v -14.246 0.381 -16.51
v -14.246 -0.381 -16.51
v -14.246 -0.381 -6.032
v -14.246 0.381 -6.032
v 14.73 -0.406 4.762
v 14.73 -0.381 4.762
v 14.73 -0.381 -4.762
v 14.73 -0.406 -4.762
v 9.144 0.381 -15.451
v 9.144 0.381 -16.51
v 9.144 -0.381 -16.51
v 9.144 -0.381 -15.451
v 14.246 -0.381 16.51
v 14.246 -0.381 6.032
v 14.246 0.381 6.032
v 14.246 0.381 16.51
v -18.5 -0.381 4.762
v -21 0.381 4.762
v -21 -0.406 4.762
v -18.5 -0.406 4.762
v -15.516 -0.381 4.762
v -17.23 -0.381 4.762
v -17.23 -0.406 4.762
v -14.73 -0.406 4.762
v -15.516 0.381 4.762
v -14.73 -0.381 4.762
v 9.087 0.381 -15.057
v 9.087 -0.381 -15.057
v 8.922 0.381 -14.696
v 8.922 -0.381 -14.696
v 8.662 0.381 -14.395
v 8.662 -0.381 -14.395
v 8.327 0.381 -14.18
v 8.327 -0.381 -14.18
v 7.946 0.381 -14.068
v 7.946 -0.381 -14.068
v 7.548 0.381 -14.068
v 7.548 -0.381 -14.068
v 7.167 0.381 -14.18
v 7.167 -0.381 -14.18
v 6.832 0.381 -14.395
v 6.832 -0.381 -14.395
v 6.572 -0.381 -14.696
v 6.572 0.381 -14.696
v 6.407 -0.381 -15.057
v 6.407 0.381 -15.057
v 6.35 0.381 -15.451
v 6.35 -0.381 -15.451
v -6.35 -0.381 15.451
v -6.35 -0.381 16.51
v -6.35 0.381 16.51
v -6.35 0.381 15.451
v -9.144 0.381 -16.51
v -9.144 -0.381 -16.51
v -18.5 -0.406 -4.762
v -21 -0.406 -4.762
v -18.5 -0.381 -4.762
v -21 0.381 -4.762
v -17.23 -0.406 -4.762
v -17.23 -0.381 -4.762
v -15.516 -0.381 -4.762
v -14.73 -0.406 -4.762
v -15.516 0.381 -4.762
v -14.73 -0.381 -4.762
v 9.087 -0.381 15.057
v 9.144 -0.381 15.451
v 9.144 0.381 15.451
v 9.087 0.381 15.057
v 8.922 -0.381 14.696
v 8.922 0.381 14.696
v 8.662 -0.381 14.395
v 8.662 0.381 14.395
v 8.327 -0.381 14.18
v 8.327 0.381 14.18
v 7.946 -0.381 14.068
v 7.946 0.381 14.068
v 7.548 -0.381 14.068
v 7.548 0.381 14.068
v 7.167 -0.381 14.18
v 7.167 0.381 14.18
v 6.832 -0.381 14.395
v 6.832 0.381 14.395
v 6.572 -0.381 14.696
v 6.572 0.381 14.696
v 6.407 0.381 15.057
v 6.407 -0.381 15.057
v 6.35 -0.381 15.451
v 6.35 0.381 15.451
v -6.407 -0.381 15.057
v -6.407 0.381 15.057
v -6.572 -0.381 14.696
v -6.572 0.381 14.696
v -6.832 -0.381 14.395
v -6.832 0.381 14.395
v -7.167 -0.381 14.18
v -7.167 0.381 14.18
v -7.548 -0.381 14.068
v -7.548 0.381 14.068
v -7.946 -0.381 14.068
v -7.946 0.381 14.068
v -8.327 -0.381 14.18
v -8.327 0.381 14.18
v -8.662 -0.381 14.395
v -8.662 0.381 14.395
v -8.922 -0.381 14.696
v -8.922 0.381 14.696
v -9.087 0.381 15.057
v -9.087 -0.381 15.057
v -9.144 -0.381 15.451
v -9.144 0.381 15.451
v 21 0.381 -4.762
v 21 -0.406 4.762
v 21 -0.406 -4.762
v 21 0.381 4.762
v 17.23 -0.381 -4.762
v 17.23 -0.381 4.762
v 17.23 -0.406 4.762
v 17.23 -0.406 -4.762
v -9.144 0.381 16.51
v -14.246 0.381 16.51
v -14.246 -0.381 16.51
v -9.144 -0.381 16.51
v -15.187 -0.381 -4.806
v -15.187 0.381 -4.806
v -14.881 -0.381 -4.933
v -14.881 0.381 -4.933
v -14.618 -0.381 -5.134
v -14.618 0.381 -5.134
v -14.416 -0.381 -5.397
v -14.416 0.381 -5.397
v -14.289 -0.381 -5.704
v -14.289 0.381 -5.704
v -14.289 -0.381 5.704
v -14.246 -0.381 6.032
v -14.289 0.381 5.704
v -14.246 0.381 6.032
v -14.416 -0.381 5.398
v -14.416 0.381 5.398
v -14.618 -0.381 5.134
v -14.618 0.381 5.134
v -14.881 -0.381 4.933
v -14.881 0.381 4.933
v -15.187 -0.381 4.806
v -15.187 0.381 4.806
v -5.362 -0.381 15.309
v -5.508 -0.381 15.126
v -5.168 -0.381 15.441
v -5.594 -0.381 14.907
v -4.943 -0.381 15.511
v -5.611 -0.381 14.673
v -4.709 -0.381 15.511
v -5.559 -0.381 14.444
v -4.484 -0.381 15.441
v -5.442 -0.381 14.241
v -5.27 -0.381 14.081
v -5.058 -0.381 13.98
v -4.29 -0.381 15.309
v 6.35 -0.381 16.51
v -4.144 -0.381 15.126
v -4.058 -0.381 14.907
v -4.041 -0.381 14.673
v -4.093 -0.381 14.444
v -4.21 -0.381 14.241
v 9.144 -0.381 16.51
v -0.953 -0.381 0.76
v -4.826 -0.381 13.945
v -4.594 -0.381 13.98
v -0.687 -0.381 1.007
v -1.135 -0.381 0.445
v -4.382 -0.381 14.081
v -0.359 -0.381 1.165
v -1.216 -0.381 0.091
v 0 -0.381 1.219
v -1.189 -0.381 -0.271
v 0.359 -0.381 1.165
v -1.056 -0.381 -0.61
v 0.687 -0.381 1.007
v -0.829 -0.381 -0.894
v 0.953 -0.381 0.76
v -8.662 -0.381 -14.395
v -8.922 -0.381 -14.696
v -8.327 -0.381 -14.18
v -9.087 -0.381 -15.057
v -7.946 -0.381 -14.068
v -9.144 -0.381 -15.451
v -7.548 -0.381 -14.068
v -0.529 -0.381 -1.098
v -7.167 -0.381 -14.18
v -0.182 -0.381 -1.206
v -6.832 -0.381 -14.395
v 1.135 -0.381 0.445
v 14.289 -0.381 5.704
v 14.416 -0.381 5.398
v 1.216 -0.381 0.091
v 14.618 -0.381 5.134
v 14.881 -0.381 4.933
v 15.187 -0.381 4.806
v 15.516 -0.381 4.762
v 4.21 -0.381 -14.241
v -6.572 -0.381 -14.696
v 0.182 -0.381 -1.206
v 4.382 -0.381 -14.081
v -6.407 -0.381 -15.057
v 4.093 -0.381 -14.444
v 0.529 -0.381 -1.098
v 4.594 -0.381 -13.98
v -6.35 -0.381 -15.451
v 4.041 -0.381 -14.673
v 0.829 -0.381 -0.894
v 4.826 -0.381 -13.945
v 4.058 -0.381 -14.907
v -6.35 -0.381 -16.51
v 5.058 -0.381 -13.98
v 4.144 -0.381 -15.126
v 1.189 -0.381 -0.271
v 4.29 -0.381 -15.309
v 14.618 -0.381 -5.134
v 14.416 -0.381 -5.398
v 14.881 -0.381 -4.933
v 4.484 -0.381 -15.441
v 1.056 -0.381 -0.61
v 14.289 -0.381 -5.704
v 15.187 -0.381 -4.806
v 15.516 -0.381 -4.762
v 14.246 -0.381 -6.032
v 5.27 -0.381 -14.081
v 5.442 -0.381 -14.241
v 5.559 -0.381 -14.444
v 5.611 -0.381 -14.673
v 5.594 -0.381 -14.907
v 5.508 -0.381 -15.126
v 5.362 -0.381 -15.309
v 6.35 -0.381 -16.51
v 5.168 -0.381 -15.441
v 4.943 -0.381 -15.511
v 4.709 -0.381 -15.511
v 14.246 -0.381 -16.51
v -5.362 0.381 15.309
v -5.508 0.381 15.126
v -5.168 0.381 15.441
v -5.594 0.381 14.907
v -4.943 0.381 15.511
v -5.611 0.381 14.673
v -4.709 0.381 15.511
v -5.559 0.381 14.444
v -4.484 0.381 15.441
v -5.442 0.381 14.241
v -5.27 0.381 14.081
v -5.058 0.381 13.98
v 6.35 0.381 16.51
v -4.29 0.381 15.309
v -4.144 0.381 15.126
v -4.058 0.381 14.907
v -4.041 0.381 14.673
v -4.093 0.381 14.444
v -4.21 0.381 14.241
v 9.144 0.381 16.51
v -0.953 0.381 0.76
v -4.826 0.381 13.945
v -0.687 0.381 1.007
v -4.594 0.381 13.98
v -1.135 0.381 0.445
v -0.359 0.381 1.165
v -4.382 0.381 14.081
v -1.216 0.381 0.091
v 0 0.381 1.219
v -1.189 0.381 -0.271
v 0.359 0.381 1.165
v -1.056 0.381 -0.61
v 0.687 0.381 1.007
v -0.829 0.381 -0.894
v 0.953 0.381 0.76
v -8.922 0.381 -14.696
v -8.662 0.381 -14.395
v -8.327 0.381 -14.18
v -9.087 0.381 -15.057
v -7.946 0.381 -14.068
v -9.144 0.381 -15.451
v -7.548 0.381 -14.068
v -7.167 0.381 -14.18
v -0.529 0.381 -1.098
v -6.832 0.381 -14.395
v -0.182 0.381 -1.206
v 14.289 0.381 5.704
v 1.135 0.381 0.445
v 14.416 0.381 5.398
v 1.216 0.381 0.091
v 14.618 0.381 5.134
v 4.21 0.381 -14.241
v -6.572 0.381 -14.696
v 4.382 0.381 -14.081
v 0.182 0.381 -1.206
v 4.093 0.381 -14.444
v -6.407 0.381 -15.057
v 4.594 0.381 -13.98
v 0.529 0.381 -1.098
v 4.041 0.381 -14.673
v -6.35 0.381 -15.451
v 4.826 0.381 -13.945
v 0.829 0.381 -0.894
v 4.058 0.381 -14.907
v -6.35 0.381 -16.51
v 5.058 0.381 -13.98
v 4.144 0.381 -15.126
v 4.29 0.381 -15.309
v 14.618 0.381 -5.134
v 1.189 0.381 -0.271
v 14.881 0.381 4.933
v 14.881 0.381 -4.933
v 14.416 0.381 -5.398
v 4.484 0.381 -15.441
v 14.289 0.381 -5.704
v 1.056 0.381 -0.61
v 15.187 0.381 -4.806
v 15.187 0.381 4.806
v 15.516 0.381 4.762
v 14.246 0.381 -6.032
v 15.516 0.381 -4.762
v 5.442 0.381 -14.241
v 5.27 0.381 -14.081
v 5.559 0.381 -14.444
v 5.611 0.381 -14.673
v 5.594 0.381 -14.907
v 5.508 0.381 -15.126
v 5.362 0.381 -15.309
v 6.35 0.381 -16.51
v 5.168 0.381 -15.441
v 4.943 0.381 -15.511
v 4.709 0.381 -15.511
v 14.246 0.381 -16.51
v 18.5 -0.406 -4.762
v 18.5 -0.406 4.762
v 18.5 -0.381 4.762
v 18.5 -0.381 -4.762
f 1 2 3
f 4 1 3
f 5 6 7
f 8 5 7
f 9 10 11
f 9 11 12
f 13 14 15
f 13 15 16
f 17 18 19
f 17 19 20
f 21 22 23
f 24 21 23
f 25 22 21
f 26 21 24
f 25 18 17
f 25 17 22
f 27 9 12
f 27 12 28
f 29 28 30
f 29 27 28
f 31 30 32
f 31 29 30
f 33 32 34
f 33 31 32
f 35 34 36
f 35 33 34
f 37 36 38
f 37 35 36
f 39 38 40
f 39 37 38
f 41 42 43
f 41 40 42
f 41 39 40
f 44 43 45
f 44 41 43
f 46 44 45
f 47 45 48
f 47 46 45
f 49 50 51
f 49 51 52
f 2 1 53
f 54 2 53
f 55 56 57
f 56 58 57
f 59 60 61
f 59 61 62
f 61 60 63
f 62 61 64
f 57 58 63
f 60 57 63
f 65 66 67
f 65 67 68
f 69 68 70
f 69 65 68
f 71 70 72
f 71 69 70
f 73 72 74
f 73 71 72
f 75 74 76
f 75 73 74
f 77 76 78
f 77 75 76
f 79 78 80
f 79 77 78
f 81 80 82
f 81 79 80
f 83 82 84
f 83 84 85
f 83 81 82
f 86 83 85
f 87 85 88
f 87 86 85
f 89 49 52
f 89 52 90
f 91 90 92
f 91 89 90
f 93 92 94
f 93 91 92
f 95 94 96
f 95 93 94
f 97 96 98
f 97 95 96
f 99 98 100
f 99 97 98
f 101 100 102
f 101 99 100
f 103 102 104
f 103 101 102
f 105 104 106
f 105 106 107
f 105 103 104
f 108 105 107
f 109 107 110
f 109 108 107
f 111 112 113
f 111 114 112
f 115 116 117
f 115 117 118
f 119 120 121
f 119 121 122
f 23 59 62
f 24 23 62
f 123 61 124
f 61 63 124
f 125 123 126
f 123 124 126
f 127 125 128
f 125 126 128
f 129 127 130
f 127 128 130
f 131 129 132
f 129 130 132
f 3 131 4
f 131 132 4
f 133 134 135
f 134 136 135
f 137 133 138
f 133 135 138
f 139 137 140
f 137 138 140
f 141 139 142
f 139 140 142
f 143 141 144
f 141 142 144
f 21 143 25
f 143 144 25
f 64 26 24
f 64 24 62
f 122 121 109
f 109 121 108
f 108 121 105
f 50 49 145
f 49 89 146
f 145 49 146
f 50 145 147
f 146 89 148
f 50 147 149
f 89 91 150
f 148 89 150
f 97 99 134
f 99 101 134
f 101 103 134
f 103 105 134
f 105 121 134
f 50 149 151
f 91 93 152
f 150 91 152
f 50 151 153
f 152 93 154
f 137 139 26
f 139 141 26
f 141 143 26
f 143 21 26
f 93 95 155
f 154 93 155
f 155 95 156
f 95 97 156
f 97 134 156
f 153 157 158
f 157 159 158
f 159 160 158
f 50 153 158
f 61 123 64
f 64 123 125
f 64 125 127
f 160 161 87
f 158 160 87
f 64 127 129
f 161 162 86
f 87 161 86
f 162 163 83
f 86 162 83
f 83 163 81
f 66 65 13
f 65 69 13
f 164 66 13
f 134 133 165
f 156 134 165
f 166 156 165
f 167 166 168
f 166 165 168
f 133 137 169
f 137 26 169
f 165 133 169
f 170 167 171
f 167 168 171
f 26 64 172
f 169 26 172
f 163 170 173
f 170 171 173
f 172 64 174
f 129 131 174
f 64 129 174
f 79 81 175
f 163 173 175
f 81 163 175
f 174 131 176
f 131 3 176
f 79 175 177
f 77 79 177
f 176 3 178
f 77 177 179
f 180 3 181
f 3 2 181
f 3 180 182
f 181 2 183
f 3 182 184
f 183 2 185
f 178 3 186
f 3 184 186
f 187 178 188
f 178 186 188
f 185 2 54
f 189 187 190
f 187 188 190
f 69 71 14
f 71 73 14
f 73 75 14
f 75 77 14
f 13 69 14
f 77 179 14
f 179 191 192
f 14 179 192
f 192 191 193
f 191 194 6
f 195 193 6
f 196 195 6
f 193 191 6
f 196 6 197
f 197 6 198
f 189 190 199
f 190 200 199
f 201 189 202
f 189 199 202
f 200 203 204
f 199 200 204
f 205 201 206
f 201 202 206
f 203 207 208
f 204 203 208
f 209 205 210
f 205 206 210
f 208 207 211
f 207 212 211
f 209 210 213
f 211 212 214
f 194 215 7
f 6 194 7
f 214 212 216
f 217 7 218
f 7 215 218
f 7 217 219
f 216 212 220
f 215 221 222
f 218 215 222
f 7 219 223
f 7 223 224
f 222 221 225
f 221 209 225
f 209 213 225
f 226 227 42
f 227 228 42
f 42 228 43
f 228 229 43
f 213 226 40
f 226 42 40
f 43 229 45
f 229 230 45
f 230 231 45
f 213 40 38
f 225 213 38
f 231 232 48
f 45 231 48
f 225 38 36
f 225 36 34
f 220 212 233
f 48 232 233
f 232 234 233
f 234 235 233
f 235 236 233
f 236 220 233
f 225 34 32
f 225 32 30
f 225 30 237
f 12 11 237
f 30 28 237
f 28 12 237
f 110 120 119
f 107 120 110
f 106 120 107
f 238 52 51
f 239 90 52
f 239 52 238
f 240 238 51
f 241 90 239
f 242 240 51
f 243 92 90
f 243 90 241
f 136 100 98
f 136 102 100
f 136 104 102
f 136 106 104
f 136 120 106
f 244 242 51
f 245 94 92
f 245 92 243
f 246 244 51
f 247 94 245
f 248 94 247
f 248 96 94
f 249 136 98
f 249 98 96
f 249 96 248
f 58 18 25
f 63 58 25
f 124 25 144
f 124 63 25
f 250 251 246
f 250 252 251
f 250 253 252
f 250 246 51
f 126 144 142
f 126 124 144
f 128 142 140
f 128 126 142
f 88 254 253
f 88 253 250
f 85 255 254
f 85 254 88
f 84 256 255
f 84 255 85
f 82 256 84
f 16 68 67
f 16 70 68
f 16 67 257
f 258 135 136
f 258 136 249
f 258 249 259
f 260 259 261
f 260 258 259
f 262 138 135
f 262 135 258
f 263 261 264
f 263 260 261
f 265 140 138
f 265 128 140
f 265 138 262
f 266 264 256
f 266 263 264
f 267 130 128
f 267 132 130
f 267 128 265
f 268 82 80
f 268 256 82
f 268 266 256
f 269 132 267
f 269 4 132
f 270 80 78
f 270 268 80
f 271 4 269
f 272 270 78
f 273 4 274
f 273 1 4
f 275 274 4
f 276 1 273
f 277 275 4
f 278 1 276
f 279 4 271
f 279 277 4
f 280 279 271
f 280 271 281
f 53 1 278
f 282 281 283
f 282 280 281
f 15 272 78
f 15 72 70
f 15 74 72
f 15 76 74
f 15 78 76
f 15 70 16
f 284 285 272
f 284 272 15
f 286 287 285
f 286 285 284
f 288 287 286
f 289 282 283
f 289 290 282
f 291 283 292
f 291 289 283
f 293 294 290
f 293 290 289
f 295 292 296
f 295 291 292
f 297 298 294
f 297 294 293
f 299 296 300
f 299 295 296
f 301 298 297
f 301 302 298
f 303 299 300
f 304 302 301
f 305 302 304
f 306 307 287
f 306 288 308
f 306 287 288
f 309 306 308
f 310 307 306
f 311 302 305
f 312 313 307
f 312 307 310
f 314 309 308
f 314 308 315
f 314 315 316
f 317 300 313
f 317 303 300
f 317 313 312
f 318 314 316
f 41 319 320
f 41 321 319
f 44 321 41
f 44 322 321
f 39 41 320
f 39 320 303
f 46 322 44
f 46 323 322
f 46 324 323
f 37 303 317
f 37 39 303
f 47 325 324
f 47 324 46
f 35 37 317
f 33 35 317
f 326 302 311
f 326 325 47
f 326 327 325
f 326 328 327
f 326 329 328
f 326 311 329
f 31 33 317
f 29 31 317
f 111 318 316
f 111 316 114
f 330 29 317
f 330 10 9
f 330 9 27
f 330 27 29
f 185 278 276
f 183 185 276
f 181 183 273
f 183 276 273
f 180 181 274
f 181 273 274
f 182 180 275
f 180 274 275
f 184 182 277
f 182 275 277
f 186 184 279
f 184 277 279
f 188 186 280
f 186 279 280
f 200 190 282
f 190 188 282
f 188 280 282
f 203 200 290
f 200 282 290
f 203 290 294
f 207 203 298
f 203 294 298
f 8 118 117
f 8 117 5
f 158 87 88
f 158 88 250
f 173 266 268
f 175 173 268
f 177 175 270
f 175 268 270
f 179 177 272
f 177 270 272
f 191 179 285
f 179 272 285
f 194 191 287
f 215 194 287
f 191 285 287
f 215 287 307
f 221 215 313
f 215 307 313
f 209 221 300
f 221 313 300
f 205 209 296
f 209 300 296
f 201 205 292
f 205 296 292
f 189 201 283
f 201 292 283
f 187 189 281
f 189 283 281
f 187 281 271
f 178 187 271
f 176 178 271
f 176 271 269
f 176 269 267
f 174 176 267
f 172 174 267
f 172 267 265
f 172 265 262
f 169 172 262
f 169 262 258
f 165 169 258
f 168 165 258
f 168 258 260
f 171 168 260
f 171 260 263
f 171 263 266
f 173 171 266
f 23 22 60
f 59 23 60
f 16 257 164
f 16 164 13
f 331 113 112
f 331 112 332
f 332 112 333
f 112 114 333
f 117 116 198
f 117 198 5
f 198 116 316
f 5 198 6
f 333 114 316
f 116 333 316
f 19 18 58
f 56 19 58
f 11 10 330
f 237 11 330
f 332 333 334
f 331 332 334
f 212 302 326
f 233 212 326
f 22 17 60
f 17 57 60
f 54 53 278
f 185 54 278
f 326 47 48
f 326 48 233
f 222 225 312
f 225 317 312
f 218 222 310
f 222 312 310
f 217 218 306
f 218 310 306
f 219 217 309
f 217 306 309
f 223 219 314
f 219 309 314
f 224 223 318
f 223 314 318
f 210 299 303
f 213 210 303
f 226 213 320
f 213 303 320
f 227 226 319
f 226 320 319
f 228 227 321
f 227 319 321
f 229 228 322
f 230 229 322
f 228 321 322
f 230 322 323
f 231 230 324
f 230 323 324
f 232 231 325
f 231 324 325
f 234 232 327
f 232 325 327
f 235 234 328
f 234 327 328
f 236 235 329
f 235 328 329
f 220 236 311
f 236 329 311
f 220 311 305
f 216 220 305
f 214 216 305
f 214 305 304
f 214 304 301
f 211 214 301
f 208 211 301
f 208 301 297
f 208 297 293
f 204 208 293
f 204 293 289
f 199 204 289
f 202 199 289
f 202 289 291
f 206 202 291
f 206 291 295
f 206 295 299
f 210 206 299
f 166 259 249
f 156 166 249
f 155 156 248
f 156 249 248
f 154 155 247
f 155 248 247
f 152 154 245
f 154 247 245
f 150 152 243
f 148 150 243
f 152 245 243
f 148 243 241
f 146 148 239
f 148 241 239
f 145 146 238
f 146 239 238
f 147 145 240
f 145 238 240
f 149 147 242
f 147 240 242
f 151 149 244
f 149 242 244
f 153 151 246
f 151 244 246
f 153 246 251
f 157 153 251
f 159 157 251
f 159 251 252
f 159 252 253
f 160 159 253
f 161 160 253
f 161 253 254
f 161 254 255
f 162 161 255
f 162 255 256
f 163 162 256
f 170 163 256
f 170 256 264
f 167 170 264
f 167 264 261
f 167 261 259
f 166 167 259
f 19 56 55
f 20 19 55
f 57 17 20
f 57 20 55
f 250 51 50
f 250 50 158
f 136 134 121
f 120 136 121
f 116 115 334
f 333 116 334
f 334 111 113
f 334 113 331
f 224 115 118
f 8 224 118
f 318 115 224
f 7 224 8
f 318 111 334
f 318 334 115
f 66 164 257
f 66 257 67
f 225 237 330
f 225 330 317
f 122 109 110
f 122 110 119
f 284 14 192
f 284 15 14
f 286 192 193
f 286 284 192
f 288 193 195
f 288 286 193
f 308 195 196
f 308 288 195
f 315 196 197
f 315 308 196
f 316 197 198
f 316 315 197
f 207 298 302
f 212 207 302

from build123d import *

# Parameters (mm, degrees)
SKETCH1_W            = 42
SKETCH1_H            = 33.02
BOSS_EXTRUDE1_DEPTH  = 0.381
SKETCH3_R            = 1.2192
CUT_EXTRUDE2_DEPTH   = 1.5875
CUT_EXTRUDE1_REACH   = 28.724
CUT_EXTRUDE3_START   = -0.762
CUT_EXTRUDE3_DEPTH   = 0.762
FILLET1_R            = 1.27
CUT_EXTRUDE4_REACH   = 28.724
SKETCH7_R            = 0.7874
FILLET1_OF_MIRROR1_R = 1.27
MIRROR2_START        = -0.381
MIRROR2_DEPTH        = 0.762
SKETCH6_W            = 2.5
SKETCH6_H            = 9.525
BOSS_EXTRUDE2_DEPTH  = 0.0254
CIRPATTERN1_COUNT    = 2


# Read off the part's stored shape, not the designer's step: Mirror2
with BuildPart() as part:
    # Sketch1 → Boss-Extrude1 (new, symmetric)
    with BuildSketch(Plane(origin=(0, 0, 0), x_dir=(1, 0, 0), z_dir=(0, 1, 0))):
        Rectangle(SKETCH1_W, SKETCH1_H)
    extrude(amount=BOSS_EXTRUDE1_DEPTH, both=True)

    # Sketch3 → Cut-Extrude2 (cut)
    with BuildSketch(Plane(origin=(0, 0.381, 0), x_dir=(1, 0, 0), z_dir=(0, 1, 0))):
        with Locations(Location((0, 0, 0), (0, 0, 270))):
            Circle(SKETCH3_R)
    extrude(amount=-CUT_EXTRUDE2_DEPTH, mode=Mode.SUBTRACT)

    # Sketch2 → Cut-Extrude1 (cut, up to next)
    with BuildSketch(Plane(origin=(0, 0.381, 0), x_dir=(1, 0, 0), z_dir=(0, 1, 0)), mode=Mode.PRIVATE) as cut_extrude1_sk1:
        with BuildLine():
            Line((9.144, 16.51), (9.144, 15.45082))
            ThreePointArc((9.144, 15.45082), (7.747, 14.05382), (6.35, 15.45082))
            Line((6.35, 15.45082), (6.35, 16.51))
            ThreePointArc((6.35, 16.51), (7.747, 17.907), (9.144, 16.51))
        make_face()
    cut_extrude1_tool1 = extrude(cut_extrude1_sk1.sketch, amount=-CUT_EXTRUDE1_REACH, mode=Mode.PRIVATE) & part.part
    cut_extrude1 = cut_extrude1_tool1.solids().sort_by_distance((7.747, 0.381, -15.98041))[0]
    add(cut_extrude1, mode=Mode.SUBTRACT)

    # Sketch5 → Cut-Extrude3 (cut)
    with BuildSketch(Plane(origin=(0, 0.381, 0), x_dir=(1, 0, 0), z_dir=(0, 1, 0)).offset(CUT_EXTRUDE3_START)):
        Polygon((21, 4.7625), (21, -4.7625), (14.24559, -4.7625), (14.24559, -19.569767896), (25.307623141, -19.569767896), (25.307623141, 18.786679146), (14.24559, 18.786679146), (14.24559, 4.7625), align=None)
    cut_extrude3 = extrude(amount=CUT_EXTRUDE3_DEPTH, mode=Mode.SUBTRACT)

    # Fillet1
    fillet1_edges = [part.edges().sort_by_distance(p)[0] for p in [
        (14.24559, 0, 4.7625),
        (14.24559, 0, -4.7625),
    ]]
    fillet(fillet1_edges, radius=FILLET1_R)

    # Sketch7 → Cut-Extrude4 (cut, up to next)
    with BuildSketch(Plane(origin=(0, 0.381, 0), x_dir=(1, 0, 0), z_dir=(0, 1, 0)), mode=Mode.PRIVATE) as cut_extrude4_sk1:
        with Locations(Location((4.826, 14.732, 0), (0, 0, 270))):
            Circle(SKETCH7_R)
    cut_extrude4_tool1 = extrude(cut_extrude4_sk1.sketch, amount=-CUT_EXTRUDE4_REACH, mode=Mode.PRIVATE) & part.part
    cut_extrude4 = cut_extrude4_tool1.solids().sort_by_distance((4.826, 0.381, -14.732))[0]
    add(cut_extrude4, mode=Mode.SUBTRACT)

    # Mirror1: Cut-Extrude1, Cut-Extrude3 across plane
    add(cut_extrude1.mirror(Plane(origin=(0, 0, 0), x_dir=(0, 0, 1), z_dir=(1, 0, 0))), mode=Mode.SUBTRACT)
    add(cut_extrude3.mirror(Plane(origin=(0, 0, 0), x_dir=(0, 0, 1), z_dir=(1, 0, 0))), mode=Mode.SUBTRACT)

    # Fillet1 of Mirror1
    fillet1_of_mirror1_edges = [part.edges().sort_by_distance(p)[0] for p in [
        (-14.24559, 0, 4.7625),
        (-14.24559, 0, -4.7625),
    ]]
    fillet(fillet1_of_mirror1_edges, radius=FILLET1_OF_MIRROR1_R)

    # Mirror2 outline → Mirror2 (cut)
    with BuildSketch(Plane(origin=(0, 0, 0), x_dir=(1, 0, 0), z_dir=(0, 1, 0)).offset(MIRROR2_START)):
        with BuildLine():
            Line((-9.144, -16.51), (-6.35, -16.51))
            Line((-6.35, -16.51), (-6.35, -15.45082))
            ThreePointArc((-6.35, -15.45082), (-7.747, -14.05382), (-9.144, -15.45082))
            Line((-9.144, -15.45082), (-9.144, -16.51))
        make_face()
        with BuildLine():
            Line((9.144, -16.51), (9.144, -15.45082))
            ThreePointArc((9.144, -15.45082), (7.747, -14.05382), (6.35, -15.45082))
            Line((6.35, -15.45082), (6.35, -16.51))
            Line((6.35, -16.51), (9.144, -16.51))
        make_face()
    extrude(amount=MIRROR2_DEPTH, mode=Mode.SUBTRACT)

    # Sketch6 → Boss-Extrude2 (add)
    with BuildSketch(Plane(origin=(0, -0.381, 0), x_dir=(1, 0, 0), z_dir=(0, 1, 0))):
        with Locations((-19.75, 0)):
            Rectangle(SKETCH6_W, SKETCH6_H)
        with Locations((-15.98, 0)):
            Rectangle(SKETCH6_W, SKETCH6_H)
    boss_extrude2 = extrude(amount=-BOSS_EXTRUDE2_DEPTH)

    # Mirror3: Boss-Extrude2 across plane
    add(boss_extrude2.mirror(Plane(origin=(0, 0, 0), x_dir=(0, 0, 1), z_dir=(1, 0, 0))))

    # CirPattern1: Cut-Extrude4 ×2 about axis
    cirpattern1_axis = Axis((0, 0, 0), (0, 1, 0))
    for i in range(1, CIRPATTERN1_COUNT):
        add(cut_extrude4.rotate(cirpattern1_axis, i * 360 / CIRPATTERN1_COUNT), mode=Mode.SUBTRACT)


solid = part.part
